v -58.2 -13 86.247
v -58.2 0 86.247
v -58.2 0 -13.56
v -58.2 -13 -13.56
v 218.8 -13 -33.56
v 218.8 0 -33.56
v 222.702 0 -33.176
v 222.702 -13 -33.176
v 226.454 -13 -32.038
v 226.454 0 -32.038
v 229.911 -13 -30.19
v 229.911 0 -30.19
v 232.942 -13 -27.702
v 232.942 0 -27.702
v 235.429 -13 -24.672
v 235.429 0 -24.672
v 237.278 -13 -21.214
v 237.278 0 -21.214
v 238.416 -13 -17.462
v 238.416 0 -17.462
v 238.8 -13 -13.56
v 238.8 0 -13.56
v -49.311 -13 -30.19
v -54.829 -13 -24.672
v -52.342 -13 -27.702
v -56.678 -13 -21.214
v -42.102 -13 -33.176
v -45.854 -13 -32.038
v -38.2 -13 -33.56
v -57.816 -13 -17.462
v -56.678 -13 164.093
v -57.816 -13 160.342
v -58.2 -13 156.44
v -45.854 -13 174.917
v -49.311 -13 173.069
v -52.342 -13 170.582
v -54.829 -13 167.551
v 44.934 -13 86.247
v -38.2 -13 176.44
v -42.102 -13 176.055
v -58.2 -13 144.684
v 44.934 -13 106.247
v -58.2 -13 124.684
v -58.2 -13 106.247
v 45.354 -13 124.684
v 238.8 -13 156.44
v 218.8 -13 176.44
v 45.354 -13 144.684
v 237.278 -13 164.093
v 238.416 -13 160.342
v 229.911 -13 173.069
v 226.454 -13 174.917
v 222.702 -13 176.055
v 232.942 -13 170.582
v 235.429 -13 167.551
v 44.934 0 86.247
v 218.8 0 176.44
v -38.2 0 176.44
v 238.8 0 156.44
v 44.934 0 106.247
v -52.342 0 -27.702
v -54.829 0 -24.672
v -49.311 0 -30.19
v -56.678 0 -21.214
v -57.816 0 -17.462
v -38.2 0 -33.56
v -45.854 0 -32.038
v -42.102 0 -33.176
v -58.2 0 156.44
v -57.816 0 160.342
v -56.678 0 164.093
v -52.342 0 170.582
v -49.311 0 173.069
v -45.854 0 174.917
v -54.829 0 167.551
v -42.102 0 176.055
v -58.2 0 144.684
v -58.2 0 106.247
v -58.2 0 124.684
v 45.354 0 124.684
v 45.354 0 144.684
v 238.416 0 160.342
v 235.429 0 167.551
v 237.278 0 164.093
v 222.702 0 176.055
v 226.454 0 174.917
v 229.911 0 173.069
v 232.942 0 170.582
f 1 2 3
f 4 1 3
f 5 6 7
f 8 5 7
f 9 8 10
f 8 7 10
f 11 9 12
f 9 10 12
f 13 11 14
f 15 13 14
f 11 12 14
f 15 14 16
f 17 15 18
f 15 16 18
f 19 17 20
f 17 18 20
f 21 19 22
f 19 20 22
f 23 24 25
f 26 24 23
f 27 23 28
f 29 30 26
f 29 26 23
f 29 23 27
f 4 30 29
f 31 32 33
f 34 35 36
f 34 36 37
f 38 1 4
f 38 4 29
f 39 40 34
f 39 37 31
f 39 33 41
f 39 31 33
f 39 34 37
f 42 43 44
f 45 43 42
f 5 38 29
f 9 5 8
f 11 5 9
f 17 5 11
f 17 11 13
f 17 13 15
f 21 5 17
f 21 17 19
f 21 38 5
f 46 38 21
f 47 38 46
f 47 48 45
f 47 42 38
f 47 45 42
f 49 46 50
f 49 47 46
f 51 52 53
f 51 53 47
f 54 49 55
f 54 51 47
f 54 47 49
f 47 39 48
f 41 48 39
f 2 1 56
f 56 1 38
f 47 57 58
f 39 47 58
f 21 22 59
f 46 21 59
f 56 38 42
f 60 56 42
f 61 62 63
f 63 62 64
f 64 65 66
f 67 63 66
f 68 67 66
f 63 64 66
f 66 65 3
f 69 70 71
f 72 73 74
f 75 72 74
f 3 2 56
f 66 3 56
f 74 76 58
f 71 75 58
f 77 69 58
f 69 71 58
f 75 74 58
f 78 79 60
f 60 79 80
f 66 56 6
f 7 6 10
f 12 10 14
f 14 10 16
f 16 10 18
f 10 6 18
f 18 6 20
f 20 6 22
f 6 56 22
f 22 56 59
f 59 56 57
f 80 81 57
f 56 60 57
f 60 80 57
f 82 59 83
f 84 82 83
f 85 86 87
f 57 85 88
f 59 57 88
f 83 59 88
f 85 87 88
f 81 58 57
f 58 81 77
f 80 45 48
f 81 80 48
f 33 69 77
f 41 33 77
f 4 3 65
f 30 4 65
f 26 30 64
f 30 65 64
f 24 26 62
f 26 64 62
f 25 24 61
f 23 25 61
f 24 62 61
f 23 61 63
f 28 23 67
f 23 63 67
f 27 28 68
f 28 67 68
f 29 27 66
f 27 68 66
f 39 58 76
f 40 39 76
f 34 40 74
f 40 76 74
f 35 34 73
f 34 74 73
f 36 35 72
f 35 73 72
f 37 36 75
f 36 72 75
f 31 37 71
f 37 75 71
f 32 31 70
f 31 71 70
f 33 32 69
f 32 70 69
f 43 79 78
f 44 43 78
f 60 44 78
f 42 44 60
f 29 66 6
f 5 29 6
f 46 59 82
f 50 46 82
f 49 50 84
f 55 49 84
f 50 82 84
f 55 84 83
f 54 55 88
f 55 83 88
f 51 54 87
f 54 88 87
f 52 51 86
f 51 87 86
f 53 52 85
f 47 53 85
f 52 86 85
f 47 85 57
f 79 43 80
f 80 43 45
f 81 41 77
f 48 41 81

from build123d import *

# Parameters (mm, degrees)
F1_DEPTH = 13
F2_W     = 110
F2_H     = 20
F3_DEPTH = 25
F4_W     = 110
F4_H     = 20
F5_DEPTH = 25


with BuildPart() as f1:
    # F0 (on Front) → F1 (new body)
    with BuildSketch(Plane.XZ):
        with BuildLine():
            Line((218.799954, 176.439716), (-38.200046, 176.439716))
            ThreePointArc((-38.200046, 176.439716), (-52.342182, 170.581852), (-58.200046, 156.439716))
            Line((-58.200046, 156.439716), (-58.200046, -13.560284))
            ThreePointArc((-58.200046, -13.560284), (-52.342182, -27.70242), (-38.200046, -33.560284))
            Line((-38.200046, -33.560284), (218.799954, -33.560284))
            ThreePointArc((218.799954, -33.560284), (232.942089, -27.70242), (238.799954, -13.560284))
            Line((238.799954, -13.560284), (238.799954, 156.439716))
            ThreePointArc((238.799954, 156.439716), (232.942089, 170.581852), (218.799954, 176.439716))
        make_face()
    extrude(amount=F1_DEPTH)

    # F2 (on face) → F3 (cut)
    with BuildSketch(Plane.XZ.offset(13)):
        with Locations((-9.645737, 134.683969)):
            Rectangle(F2_W, F2_H)
    extrude(amount=-F3_DEPTH, mode=Mode.SUBTRACT)

    # F4 (on face) → F5 (cut)
    with BuildSketch(Plane.XZ.offset(13)):
        with Locations((-10.065921, 96.247018)):
            Rectangle(F4_W, F4_H)
    extrude(amount=-F5_DEPTH, mode=Mode.SUBTRACT)


solid = f1.part
